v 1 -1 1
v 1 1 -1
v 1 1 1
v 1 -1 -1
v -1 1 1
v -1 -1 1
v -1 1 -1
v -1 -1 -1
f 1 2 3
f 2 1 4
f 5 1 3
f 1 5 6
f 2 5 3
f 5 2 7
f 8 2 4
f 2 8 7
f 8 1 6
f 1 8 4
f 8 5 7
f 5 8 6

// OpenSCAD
// Volume: 8, SurfaceArea: 24
// transformation matrices should consist of all -1, 0, and 1 values
for(mx=[0,1],my=[0,1],mz=[0,1]) {
  m = [mx,my,mz];
  if (m == [1,1,1]) scale(-1) cube(); // can't mirror all 3 axes with single mirror operation
  else mirror(m) cube();
}
